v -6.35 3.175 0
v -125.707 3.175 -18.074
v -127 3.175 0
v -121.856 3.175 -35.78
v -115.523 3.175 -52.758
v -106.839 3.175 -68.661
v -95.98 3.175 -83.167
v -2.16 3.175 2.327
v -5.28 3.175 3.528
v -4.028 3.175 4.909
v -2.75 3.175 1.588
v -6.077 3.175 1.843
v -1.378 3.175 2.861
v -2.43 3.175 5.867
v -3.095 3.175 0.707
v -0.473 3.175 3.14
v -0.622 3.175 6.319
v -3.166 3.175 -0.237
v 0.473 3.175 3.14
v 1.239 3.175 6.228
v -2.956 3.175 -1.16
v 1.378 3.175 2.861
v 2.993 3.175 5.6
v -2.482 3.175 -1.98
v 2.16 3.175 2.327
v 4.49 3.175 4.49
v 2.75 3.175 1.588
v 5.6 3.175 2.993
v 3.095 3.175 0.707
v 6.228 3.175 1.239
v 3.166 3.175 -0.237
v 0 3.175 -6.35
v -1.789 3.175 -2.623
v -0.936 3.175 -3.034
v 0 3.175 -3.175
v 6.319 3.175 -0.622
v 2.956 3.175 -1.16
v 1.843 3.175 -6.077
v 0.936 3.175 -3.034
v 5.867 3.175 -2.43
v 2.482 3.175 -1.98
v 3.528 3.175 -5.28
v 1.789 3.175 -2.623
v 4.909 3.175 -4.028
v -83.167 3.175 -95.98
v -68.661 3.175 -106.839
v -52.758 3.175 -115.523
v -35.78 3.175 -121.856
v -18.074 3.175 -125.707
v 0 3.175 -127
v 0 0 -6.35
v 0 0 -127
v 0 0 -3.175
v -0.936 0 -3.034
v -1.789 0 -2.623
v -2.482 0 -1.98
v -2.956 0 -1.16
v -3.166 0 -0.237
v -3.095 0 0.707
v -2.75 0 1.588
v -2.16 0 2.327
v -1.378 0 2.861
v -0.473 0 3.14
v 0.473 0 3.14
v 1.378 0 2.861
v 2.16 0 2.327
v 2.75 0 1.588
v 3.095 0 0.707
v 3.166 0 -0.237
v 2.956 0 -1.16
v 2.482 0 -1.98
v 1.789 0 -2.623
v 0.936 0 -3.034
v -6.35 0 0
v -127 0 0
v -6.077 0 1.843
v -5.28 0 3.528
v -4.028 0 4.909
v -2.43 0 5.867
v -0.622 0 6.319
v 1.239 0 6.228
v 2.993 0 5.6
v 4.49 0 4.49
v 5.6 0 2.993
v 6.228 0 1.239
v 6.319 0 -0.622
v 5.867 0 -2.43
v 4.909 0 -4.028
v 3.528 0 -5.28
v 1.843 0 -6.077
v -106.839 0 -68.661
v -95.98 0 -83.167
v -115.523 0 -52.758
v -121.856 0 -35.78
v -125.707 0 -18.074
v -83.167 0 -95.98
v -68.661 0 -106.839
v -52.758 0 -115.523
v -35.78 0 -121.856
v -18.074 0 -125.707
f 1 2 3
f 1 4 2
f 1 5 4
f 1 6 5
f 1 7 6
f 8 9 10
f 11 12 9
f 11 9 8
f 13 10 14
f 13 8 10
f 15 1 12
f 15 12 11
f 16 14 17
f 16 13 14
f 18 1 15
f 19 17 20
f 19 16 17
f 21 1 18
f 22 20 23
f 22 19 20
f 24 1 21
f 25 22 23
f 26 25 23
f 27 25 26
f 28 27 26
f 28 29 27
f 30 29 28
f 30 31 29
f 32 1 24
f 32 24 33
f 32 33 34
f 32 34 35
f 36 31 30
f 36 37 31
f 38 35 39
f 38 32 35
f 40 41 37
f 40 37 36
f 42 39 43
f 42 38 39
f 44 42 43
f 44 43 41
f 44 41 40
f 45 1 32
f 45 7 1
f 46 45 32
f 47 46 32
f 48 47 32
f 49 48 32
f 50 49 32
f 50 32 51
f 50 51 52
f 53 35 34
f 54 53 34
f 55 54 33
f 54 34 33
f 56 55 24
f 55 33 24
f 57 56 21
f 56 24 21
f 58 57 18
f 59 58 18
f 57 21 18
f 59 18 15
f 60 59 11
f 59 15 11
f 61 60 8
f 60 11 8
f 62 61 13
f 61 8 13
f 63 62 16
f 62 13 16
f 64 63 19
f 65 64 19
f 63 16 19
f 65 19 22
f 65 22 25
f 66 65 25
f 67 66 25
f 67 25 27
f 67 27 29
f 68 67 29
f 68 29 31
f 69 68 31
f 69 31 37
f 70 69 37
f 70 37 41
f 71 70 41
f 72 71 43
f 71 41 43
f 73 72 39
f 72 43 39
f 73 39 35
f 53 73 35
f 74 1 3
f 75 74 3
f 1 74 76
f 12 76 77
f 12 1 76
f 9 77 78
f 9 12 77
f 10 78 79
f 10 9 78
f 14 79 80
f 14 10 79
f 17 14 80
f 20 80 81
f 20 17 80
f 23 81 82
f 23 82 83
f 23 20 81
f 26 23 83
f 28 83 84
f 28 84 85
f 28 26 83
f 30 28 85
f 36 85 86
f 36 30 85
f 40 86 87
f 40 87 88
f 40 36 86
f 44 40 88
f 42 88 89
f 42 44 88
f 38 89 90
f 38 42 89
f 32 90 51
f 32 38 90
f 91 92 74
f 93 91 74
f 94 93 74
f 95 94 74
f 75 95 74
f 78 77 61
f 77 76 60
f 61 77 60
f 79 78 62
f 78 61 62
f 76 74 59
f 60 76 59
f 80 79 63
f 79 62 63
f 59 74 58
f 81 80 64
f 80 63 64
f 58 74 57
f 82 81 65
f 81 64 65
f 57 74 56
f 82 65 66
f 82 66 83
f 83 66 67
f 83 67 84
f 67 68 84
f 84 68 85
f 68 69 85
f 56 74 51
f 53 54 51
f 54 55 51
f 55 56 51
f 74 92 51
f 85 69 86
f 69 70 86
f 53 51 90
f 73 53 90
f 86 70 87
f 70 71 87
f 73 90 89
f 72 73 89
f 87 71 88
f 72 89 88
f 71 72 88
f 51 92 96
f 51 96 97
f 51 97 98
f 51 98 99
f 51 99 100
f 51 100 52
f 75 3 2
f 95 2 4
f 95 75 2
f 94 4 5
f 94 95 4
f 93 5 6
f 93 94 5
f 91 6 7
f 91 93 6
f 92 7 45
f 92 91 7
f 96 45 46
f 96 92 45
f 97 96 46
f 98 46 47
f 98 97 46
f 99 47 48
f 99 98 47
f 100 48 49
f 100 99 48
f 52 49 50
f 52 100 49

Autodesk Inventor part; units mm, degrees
ref_plane "YZ Plane" through (0, 0, 0) normal (1, 0, 0) x (0, 1, 0)
ref_plane "XZ Plane" through (0, 0, 0) normal (0, 1, 0) x (-1, 0, 0)
ref_plane "XY Plane" through (0, 0, 0) normal (0, 0, 1) x (1, 0, 0)
sketch "Sketch5" plane through (0, 0, 0) normal (0, 1, 0) x (-1, 0, 0)
  line L0 (0, 0) -> (127, 0) construction
  circle A0 centre (0, 0) radius 127
  line L1 (0, 0) -> (127, 0)
  line L2 (0, 0) -> (0, -127)
  dimension "d27" = 254
extrude "Extrusion2" add sketch "Sketch5" along normal blind 3.175
sketch "Sketch6" plane through (0, 3.175, 0) normal (0, 1, 0) x (1, 0, 0)
  circle A0 centre (0, 0) radius 127 projected
  line L0 (0, 0) -> (-127, 0)
  line L1 (0, 0) -> (0, 127)
  line L2 (-127, 0) -> (-147.1811, -31.5463)
  line L3 (-147.1811, -31.5463) -> (-90.1509, -154.4564)
  line L4 (-90.1509, -154.4564) -> (47.5084, -160.3561)
  line L5 (47.5084, -160.3561) -> (160.365, -93.0014)
  line L6 (160.365, -93.0014) -> (183.4453, 199.208)
  line L7 (183.4453, 199.208) -> (0, 127)
extrude "Extrusion3" cut sketch "Sketch6" against normal blind 3.175 contours A0 L0 L1 picked at (43.7214, -72.324)
sketch "Sketch9" plane through (0, 3.175, 0) normal (0, 1, 0) x (1, 0, 0)
  circle A0 centre (0, 0) radius 6.35
  circle A1 centre (0, 0) radius 3.175
  dimension "d37" = 12.7
  dimension "d38" = 6.35
extrude "Extrusion5" add sketch "Sketch9" against normal blind 3.175
sketch "Sketch10" plane through (0, 3.175, 0) normal (0, 1, 0) x (1, 0, 0)
  circle A0 centre (0, 0) radius 3.175
  dimension "d41" = 6.35
extrude "Extrusion6" cut sketch "Sketch10" against normal blind 6.35
sketch "Sketch11" plane through (0, 3.175, 0) normal (0, 1, 0) x (1, 0, 0)
  arc A0 (0, 127) -> (-127, 0) centre (0, 0) ccw projected
  arc A1 (0, 127) -> (0, 127) centre (0, 0) ccw
  line L0 (-127, 0) -> (0, 0)
  line L1 (-127, 0) -> (0, 0)
  line L2 (-120.7842, 39.2452) -> (0, 0)
  circle A2 centre (0, 0) radius 3.175 projected
  line L3 (-102.7452, 74.6487) -> (0, 0)
  line L4 (0, 0) -> (-74.6487, 102.7452)
  line L5 (-39.2452, 120.7842) -> (0, 0)
  point P0 (0, 127)
  dimension "d52" = 90
equation "\"d42\" = d41"
properties part number "swiweller"
